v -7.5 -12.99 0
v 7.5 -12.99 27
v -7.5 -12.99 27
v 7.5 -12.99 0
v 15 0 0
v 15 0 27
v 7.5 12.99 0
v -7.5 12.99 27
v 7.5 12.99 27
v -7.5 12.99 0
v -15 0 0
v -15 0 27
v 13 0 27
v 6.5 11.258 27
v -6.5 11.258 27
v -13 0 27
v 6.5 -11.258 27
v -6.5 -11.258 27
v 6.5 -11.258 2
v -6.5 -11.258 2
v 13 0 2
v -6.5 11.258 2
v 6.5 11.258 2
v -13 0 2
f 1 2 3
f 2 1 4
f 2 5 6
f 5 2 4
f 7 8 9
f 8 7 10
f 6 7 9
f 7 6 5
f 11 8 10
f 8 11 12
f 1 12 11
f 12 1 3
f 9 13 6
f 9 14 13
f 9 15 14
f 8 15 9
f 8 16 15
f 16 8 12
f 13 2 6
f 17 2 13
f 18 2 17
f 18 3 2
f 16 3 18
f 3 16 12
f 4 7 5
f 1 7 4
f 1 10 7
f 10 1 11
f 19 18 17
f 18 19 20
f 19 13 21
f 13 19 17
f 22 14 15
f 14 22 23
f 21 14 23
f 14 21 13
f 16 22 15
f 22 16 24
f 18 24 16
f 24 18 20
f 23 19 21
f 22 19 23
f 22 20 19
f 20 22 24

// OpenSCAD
difference(){
cylinder(h=27,r1=15,r2=15,$fn=6);
    translate([0,0,2])
    cylinder(h=25.5,r1=13,r2=13,$fn=6);
}
